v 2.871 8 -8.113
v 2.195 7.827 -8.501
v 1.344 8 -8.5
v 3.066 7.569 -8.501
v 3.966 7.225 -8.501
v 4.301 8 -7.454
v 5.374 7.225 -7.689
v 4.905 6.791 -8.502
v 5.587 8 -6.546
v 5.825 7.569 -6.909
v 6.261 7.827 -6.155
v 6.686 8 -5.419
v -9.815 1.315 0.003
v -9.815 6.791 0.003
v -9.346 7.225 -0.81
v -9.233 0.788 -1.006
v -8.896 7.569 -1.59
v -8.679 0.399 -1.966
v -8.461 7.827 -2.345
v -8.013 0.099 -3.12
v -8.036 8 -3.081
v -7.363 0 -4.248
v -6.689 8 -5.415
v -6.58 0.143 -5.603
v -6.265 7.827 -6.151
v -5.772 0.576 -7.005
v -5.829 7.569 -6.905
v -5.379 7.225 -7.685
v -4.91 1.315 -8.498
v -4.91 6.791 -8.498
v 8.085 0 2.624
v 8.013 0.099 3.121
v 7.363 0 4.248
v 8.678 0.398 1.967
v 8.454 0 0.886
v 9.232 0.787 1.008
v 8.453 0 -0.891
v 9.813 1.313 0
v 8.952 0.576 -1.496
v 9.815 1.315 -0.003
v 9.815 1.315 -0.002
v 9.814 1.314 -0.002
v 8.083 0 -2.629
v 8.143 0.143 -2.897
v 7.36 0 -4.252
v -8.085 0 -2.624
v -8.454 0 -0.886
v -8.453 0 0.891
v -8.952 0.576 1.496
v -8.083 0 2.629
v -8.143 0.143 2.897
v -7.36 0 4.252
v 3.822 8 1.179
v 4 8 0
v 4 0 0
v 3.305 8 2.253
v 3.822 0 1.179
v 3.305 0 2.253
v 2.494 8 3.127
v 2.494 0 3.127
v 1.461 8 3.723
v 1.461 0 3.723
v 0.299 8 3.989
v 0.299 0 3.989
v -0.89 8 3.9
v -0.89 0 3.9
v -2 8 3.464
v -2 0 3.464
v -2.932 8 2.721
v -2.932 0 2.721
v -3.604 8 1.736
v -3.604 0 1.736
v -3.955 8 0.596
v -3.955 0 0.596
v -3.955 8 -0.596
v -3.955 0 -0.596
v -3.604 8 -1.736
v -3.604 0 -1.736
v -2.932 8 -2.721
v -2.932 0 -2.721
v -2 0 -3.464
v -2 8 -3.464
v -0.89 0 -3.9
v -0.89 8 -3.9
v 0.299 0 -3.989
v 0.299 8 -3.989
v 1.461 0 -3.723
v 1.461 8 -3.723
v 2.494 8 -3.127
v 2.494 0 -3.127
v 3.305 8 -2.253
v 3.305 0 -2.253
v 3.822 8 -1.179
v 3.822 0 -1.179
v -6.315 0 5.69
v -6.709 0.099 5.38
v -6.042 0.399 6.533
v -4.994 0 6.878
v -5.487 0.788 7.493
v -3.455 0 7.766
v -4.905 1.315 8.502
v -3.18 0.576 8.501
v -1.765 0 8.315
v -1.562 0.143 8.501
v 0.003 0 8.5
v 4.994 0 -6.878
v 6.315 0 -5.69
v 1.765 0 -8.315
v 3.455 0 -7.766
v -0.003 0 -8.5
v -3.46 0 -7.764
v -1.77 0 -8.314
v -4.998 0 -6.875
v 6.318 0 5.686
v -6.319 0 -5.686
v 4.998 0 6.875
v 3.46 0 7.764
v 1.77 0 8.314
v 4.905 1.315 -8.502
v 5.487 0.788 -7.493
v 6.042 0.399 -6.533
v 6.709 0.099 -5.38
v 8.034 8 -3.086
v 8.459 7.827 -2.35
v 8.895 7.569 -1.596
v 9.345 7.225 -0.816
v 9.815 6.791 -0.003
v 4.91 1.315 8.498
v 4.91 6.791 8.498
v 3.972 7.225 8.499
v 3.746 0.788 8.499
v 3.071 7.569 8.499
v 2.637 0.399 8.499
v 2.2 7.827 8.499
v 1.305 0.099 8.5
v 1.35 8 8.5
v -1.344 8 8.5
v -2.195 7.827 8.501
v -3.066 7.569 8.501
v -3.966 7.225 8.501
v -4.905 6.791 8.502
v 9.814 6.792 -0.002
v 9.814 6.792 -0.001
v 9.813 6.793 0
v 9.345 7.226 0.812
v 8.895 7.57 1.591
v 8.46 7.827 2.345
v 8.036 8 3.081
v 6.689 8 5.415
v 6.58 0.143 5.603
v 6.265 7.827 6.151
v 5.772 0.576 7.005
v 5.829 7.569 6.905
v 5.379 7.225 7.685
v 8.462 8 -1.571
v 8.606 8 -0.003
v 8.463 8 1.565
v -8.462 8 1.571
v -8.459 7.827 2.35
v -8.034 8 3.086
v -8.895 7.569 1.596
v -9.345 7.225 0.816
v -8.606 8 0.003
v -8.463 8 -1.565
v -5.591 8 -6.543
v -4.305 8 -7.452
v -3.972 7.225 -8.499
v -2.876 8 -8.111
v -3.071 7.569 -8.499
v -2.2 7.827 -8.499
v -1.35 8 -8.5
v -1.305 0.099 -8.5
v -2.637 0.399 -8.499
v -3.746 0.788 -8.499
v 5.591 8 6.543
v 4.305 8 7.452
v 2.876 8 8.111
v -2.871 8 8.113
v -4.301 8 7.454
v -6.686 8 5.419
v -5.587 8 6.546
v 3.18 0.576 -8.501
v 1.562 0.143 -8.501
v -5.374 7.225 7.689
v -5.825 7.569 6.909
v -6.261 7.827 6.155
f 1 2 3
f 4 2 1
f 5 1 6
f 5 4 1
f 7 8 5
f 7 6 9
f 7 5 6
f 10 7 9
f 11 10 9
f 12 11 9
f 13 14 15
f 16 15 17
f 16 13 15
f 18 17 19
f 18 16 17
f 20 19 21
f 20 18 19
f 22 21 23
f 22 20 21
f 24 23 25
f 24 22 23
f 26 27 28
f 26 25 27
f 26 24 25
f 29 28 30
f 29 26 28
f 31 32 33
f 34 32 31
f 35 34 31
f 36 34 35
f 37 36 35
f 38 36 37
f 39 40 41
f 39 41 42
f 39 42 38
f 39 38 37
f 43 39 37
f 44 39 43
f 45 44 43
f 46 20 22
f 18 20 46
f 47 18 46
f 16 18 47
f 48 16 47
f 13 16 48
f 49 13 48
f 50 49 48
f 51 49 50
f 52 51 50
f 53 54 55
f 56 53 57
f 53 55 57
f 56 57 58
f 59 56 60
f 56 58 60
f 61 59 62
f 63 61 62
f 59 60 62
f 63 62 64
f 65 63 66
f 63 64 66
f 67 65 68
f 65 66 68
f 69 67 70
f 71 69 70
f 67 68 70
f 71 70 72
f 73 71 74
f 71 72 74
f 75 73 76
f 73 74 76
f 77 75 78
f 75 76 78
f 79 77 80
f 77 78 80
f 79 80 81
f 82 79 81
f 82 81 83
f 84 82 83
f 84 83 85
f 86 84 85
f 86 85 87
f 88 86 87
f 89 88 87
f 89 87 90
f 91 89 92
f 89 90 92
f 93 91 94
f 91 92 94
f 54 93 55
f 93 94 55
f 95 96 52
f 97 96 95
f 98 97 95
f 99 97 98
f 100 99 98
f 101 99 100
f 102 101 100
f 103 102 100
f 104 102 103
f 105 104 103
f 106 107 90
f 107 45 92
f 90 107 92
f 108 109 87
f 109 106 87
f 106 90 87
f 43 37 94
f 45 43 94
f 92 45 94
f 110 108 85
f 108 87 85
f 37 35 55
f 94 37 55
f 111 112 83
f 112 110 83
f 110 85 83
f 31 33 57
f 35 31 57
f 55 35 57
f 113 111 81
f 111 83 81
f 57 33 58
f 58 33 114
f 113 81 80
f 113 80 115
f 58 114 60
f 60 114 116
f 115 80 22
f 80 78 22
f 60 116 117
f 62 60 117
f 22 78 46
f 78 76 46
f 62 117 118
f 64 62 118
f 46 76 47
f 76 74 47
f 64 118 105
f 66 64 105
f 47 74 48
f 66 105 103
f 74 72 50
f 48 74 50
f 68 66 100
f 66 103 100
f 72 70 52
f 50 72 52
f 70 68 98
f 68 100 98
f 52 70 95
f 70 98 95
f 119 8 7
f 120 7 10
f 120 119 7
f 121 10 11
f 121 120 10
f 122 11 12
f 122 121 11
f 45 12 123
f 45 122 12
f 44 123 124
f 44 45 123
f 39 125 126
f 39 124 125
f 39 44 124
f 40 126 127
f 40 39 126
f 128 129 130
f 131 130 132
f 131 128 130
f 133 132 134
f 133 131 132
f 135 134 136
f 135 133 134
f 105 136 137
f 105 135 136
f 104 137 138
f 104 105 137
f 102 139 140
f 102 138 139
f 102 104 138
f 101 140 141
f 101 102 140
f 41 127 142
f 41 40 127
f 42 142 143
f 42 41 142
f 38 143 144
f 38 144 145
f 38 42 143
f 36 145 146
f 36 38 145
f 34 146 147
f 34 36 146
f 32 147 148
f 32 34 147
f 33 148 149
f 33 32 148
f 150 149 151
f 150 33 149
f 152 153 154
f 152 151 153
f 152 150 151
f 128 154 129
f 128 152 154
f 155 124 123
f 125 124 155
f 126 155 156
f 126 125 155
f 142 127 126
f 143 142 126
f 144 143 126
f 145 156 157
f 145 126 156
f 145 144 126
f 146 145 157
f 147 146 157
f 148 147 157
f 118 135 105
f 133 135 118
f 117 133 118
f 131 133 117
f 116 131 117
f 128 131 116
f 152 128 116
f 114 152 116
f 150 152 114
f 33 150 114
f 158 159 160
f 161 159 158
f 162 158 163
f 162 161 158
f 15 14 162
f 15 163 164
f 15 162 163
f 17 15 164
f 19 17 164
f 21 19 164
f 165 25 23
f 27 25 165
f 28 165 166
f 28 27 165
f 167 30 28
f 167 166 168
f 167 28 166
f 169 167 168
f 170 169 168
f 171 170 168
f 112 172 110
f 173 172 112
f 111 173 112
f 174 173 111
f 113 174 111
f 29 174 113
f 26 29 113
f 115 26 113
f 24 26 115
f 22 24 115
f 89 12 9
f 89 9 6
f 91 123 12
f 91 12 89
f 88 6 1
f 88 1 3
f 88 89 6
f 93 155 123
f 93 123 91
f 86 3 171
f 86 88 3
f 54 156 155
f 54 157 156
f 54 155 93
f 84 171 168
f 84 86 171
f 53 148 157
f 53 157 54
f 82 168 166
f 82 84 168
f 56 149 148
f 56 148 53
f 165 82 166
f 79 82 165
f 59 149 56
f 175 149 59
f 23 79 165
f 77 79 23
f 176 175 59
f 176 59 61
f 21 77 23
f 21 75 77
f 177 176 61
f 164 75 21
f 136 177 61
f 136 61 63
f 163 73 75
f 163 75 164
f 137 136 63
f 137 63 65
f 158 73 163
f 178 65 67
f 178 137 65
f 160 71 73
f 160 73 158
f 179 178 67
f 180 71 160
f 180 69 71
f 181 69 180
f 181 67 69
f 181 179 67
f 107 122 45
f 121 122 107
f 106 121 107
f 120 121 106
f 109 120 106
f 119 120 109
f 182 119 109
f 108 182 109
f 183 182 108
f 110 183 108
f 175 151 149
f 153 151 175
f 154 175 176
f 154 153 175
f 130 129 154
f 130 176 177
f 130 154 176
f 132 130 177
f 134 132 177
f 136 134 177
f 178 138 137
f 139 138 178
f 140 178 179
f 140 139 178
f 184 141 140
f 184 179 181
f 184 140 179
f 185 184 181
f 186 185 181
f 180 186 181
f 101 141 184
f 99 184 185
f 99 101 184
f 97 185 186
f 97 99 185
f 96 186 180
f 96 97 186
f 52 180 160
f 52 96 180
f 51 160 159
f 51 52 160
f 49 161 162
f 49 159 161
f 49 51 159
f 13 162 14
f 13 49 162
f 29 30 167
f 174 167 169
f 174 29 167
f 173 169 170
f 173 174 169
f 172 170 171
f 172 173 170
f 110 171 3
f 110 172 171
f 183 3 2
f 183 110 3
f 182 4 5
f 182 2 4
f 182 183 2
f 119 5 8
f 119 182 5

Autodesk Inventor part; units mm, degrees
ref_plane "YZ Plane" through (0, 0, 0) normal (1, 0, 0) x (0, 1, 0)
ref_plane "XZ Plane" through (0, 0, 0) normal (0, 1, 0) x (-1, 0, 0)
ref_plane "XY Plane" through (0, 0, 0) normal (0, 0, 1) x (1, 0, 0)
sketch "Sketch3" plane through (0, 0, 0) normal (0, 1, 0) x (-1, 0, 0)
  line L0 (-4.9048, -8.5016) -> (-9.815, -0.0031)
  line L1 (-9.815, -0.0031) -> (-4.9102, 8.4984)
  line L2 (-4.9102, 8.4984) -> (4.9048, 8.5016)
  line L3 (4.9048, 8.5016) -> (9.815, 0.0031)
  line L4 (9.815, 0.0031) -> (4.9102, -8.4984)
  line L5 (4.9102, -8.4984) -> (-4.9048, -8.5016)
  point P0 (0, 0)
  point P1 (0, 0)
  dimension "d1" = 17
extrude "Extrusion1" add sketch "Sketch3" along normal blind 8
sketch "Sketch4" plane through (0, 8, 0) normal (0, 1, 0) x (1, 0, 0)
  circle A0 centre (0, 0) radius 8.6061
extrude "Extrusion2" cut sketch "Sketch4" against normal through all draft 45 keep common part
sketch "Sketch22" plane through (0, 0, 0) normal (0, -1, 0) x (1, 0, 0)
  circle A0 centre (0, 0) radius 8.5
  line L0 (6.6894, 5.4144) -> (8.0357, 3.0809) projected
extrude "Extrusion12" cut sketch "Sketch22" against normal blind 8 draft 45 keep common part
sketch "Sketch23" plane through (0, 0, 0) normal (0, -1, 0) x (1, 0, 0)
  circle A0 centre (0, 0) radius 4
  dimension "d111" = 8
extrude "Extrusion13" cut sketch "Sketch23" against normal blind 8
properties part number "Bolt"
